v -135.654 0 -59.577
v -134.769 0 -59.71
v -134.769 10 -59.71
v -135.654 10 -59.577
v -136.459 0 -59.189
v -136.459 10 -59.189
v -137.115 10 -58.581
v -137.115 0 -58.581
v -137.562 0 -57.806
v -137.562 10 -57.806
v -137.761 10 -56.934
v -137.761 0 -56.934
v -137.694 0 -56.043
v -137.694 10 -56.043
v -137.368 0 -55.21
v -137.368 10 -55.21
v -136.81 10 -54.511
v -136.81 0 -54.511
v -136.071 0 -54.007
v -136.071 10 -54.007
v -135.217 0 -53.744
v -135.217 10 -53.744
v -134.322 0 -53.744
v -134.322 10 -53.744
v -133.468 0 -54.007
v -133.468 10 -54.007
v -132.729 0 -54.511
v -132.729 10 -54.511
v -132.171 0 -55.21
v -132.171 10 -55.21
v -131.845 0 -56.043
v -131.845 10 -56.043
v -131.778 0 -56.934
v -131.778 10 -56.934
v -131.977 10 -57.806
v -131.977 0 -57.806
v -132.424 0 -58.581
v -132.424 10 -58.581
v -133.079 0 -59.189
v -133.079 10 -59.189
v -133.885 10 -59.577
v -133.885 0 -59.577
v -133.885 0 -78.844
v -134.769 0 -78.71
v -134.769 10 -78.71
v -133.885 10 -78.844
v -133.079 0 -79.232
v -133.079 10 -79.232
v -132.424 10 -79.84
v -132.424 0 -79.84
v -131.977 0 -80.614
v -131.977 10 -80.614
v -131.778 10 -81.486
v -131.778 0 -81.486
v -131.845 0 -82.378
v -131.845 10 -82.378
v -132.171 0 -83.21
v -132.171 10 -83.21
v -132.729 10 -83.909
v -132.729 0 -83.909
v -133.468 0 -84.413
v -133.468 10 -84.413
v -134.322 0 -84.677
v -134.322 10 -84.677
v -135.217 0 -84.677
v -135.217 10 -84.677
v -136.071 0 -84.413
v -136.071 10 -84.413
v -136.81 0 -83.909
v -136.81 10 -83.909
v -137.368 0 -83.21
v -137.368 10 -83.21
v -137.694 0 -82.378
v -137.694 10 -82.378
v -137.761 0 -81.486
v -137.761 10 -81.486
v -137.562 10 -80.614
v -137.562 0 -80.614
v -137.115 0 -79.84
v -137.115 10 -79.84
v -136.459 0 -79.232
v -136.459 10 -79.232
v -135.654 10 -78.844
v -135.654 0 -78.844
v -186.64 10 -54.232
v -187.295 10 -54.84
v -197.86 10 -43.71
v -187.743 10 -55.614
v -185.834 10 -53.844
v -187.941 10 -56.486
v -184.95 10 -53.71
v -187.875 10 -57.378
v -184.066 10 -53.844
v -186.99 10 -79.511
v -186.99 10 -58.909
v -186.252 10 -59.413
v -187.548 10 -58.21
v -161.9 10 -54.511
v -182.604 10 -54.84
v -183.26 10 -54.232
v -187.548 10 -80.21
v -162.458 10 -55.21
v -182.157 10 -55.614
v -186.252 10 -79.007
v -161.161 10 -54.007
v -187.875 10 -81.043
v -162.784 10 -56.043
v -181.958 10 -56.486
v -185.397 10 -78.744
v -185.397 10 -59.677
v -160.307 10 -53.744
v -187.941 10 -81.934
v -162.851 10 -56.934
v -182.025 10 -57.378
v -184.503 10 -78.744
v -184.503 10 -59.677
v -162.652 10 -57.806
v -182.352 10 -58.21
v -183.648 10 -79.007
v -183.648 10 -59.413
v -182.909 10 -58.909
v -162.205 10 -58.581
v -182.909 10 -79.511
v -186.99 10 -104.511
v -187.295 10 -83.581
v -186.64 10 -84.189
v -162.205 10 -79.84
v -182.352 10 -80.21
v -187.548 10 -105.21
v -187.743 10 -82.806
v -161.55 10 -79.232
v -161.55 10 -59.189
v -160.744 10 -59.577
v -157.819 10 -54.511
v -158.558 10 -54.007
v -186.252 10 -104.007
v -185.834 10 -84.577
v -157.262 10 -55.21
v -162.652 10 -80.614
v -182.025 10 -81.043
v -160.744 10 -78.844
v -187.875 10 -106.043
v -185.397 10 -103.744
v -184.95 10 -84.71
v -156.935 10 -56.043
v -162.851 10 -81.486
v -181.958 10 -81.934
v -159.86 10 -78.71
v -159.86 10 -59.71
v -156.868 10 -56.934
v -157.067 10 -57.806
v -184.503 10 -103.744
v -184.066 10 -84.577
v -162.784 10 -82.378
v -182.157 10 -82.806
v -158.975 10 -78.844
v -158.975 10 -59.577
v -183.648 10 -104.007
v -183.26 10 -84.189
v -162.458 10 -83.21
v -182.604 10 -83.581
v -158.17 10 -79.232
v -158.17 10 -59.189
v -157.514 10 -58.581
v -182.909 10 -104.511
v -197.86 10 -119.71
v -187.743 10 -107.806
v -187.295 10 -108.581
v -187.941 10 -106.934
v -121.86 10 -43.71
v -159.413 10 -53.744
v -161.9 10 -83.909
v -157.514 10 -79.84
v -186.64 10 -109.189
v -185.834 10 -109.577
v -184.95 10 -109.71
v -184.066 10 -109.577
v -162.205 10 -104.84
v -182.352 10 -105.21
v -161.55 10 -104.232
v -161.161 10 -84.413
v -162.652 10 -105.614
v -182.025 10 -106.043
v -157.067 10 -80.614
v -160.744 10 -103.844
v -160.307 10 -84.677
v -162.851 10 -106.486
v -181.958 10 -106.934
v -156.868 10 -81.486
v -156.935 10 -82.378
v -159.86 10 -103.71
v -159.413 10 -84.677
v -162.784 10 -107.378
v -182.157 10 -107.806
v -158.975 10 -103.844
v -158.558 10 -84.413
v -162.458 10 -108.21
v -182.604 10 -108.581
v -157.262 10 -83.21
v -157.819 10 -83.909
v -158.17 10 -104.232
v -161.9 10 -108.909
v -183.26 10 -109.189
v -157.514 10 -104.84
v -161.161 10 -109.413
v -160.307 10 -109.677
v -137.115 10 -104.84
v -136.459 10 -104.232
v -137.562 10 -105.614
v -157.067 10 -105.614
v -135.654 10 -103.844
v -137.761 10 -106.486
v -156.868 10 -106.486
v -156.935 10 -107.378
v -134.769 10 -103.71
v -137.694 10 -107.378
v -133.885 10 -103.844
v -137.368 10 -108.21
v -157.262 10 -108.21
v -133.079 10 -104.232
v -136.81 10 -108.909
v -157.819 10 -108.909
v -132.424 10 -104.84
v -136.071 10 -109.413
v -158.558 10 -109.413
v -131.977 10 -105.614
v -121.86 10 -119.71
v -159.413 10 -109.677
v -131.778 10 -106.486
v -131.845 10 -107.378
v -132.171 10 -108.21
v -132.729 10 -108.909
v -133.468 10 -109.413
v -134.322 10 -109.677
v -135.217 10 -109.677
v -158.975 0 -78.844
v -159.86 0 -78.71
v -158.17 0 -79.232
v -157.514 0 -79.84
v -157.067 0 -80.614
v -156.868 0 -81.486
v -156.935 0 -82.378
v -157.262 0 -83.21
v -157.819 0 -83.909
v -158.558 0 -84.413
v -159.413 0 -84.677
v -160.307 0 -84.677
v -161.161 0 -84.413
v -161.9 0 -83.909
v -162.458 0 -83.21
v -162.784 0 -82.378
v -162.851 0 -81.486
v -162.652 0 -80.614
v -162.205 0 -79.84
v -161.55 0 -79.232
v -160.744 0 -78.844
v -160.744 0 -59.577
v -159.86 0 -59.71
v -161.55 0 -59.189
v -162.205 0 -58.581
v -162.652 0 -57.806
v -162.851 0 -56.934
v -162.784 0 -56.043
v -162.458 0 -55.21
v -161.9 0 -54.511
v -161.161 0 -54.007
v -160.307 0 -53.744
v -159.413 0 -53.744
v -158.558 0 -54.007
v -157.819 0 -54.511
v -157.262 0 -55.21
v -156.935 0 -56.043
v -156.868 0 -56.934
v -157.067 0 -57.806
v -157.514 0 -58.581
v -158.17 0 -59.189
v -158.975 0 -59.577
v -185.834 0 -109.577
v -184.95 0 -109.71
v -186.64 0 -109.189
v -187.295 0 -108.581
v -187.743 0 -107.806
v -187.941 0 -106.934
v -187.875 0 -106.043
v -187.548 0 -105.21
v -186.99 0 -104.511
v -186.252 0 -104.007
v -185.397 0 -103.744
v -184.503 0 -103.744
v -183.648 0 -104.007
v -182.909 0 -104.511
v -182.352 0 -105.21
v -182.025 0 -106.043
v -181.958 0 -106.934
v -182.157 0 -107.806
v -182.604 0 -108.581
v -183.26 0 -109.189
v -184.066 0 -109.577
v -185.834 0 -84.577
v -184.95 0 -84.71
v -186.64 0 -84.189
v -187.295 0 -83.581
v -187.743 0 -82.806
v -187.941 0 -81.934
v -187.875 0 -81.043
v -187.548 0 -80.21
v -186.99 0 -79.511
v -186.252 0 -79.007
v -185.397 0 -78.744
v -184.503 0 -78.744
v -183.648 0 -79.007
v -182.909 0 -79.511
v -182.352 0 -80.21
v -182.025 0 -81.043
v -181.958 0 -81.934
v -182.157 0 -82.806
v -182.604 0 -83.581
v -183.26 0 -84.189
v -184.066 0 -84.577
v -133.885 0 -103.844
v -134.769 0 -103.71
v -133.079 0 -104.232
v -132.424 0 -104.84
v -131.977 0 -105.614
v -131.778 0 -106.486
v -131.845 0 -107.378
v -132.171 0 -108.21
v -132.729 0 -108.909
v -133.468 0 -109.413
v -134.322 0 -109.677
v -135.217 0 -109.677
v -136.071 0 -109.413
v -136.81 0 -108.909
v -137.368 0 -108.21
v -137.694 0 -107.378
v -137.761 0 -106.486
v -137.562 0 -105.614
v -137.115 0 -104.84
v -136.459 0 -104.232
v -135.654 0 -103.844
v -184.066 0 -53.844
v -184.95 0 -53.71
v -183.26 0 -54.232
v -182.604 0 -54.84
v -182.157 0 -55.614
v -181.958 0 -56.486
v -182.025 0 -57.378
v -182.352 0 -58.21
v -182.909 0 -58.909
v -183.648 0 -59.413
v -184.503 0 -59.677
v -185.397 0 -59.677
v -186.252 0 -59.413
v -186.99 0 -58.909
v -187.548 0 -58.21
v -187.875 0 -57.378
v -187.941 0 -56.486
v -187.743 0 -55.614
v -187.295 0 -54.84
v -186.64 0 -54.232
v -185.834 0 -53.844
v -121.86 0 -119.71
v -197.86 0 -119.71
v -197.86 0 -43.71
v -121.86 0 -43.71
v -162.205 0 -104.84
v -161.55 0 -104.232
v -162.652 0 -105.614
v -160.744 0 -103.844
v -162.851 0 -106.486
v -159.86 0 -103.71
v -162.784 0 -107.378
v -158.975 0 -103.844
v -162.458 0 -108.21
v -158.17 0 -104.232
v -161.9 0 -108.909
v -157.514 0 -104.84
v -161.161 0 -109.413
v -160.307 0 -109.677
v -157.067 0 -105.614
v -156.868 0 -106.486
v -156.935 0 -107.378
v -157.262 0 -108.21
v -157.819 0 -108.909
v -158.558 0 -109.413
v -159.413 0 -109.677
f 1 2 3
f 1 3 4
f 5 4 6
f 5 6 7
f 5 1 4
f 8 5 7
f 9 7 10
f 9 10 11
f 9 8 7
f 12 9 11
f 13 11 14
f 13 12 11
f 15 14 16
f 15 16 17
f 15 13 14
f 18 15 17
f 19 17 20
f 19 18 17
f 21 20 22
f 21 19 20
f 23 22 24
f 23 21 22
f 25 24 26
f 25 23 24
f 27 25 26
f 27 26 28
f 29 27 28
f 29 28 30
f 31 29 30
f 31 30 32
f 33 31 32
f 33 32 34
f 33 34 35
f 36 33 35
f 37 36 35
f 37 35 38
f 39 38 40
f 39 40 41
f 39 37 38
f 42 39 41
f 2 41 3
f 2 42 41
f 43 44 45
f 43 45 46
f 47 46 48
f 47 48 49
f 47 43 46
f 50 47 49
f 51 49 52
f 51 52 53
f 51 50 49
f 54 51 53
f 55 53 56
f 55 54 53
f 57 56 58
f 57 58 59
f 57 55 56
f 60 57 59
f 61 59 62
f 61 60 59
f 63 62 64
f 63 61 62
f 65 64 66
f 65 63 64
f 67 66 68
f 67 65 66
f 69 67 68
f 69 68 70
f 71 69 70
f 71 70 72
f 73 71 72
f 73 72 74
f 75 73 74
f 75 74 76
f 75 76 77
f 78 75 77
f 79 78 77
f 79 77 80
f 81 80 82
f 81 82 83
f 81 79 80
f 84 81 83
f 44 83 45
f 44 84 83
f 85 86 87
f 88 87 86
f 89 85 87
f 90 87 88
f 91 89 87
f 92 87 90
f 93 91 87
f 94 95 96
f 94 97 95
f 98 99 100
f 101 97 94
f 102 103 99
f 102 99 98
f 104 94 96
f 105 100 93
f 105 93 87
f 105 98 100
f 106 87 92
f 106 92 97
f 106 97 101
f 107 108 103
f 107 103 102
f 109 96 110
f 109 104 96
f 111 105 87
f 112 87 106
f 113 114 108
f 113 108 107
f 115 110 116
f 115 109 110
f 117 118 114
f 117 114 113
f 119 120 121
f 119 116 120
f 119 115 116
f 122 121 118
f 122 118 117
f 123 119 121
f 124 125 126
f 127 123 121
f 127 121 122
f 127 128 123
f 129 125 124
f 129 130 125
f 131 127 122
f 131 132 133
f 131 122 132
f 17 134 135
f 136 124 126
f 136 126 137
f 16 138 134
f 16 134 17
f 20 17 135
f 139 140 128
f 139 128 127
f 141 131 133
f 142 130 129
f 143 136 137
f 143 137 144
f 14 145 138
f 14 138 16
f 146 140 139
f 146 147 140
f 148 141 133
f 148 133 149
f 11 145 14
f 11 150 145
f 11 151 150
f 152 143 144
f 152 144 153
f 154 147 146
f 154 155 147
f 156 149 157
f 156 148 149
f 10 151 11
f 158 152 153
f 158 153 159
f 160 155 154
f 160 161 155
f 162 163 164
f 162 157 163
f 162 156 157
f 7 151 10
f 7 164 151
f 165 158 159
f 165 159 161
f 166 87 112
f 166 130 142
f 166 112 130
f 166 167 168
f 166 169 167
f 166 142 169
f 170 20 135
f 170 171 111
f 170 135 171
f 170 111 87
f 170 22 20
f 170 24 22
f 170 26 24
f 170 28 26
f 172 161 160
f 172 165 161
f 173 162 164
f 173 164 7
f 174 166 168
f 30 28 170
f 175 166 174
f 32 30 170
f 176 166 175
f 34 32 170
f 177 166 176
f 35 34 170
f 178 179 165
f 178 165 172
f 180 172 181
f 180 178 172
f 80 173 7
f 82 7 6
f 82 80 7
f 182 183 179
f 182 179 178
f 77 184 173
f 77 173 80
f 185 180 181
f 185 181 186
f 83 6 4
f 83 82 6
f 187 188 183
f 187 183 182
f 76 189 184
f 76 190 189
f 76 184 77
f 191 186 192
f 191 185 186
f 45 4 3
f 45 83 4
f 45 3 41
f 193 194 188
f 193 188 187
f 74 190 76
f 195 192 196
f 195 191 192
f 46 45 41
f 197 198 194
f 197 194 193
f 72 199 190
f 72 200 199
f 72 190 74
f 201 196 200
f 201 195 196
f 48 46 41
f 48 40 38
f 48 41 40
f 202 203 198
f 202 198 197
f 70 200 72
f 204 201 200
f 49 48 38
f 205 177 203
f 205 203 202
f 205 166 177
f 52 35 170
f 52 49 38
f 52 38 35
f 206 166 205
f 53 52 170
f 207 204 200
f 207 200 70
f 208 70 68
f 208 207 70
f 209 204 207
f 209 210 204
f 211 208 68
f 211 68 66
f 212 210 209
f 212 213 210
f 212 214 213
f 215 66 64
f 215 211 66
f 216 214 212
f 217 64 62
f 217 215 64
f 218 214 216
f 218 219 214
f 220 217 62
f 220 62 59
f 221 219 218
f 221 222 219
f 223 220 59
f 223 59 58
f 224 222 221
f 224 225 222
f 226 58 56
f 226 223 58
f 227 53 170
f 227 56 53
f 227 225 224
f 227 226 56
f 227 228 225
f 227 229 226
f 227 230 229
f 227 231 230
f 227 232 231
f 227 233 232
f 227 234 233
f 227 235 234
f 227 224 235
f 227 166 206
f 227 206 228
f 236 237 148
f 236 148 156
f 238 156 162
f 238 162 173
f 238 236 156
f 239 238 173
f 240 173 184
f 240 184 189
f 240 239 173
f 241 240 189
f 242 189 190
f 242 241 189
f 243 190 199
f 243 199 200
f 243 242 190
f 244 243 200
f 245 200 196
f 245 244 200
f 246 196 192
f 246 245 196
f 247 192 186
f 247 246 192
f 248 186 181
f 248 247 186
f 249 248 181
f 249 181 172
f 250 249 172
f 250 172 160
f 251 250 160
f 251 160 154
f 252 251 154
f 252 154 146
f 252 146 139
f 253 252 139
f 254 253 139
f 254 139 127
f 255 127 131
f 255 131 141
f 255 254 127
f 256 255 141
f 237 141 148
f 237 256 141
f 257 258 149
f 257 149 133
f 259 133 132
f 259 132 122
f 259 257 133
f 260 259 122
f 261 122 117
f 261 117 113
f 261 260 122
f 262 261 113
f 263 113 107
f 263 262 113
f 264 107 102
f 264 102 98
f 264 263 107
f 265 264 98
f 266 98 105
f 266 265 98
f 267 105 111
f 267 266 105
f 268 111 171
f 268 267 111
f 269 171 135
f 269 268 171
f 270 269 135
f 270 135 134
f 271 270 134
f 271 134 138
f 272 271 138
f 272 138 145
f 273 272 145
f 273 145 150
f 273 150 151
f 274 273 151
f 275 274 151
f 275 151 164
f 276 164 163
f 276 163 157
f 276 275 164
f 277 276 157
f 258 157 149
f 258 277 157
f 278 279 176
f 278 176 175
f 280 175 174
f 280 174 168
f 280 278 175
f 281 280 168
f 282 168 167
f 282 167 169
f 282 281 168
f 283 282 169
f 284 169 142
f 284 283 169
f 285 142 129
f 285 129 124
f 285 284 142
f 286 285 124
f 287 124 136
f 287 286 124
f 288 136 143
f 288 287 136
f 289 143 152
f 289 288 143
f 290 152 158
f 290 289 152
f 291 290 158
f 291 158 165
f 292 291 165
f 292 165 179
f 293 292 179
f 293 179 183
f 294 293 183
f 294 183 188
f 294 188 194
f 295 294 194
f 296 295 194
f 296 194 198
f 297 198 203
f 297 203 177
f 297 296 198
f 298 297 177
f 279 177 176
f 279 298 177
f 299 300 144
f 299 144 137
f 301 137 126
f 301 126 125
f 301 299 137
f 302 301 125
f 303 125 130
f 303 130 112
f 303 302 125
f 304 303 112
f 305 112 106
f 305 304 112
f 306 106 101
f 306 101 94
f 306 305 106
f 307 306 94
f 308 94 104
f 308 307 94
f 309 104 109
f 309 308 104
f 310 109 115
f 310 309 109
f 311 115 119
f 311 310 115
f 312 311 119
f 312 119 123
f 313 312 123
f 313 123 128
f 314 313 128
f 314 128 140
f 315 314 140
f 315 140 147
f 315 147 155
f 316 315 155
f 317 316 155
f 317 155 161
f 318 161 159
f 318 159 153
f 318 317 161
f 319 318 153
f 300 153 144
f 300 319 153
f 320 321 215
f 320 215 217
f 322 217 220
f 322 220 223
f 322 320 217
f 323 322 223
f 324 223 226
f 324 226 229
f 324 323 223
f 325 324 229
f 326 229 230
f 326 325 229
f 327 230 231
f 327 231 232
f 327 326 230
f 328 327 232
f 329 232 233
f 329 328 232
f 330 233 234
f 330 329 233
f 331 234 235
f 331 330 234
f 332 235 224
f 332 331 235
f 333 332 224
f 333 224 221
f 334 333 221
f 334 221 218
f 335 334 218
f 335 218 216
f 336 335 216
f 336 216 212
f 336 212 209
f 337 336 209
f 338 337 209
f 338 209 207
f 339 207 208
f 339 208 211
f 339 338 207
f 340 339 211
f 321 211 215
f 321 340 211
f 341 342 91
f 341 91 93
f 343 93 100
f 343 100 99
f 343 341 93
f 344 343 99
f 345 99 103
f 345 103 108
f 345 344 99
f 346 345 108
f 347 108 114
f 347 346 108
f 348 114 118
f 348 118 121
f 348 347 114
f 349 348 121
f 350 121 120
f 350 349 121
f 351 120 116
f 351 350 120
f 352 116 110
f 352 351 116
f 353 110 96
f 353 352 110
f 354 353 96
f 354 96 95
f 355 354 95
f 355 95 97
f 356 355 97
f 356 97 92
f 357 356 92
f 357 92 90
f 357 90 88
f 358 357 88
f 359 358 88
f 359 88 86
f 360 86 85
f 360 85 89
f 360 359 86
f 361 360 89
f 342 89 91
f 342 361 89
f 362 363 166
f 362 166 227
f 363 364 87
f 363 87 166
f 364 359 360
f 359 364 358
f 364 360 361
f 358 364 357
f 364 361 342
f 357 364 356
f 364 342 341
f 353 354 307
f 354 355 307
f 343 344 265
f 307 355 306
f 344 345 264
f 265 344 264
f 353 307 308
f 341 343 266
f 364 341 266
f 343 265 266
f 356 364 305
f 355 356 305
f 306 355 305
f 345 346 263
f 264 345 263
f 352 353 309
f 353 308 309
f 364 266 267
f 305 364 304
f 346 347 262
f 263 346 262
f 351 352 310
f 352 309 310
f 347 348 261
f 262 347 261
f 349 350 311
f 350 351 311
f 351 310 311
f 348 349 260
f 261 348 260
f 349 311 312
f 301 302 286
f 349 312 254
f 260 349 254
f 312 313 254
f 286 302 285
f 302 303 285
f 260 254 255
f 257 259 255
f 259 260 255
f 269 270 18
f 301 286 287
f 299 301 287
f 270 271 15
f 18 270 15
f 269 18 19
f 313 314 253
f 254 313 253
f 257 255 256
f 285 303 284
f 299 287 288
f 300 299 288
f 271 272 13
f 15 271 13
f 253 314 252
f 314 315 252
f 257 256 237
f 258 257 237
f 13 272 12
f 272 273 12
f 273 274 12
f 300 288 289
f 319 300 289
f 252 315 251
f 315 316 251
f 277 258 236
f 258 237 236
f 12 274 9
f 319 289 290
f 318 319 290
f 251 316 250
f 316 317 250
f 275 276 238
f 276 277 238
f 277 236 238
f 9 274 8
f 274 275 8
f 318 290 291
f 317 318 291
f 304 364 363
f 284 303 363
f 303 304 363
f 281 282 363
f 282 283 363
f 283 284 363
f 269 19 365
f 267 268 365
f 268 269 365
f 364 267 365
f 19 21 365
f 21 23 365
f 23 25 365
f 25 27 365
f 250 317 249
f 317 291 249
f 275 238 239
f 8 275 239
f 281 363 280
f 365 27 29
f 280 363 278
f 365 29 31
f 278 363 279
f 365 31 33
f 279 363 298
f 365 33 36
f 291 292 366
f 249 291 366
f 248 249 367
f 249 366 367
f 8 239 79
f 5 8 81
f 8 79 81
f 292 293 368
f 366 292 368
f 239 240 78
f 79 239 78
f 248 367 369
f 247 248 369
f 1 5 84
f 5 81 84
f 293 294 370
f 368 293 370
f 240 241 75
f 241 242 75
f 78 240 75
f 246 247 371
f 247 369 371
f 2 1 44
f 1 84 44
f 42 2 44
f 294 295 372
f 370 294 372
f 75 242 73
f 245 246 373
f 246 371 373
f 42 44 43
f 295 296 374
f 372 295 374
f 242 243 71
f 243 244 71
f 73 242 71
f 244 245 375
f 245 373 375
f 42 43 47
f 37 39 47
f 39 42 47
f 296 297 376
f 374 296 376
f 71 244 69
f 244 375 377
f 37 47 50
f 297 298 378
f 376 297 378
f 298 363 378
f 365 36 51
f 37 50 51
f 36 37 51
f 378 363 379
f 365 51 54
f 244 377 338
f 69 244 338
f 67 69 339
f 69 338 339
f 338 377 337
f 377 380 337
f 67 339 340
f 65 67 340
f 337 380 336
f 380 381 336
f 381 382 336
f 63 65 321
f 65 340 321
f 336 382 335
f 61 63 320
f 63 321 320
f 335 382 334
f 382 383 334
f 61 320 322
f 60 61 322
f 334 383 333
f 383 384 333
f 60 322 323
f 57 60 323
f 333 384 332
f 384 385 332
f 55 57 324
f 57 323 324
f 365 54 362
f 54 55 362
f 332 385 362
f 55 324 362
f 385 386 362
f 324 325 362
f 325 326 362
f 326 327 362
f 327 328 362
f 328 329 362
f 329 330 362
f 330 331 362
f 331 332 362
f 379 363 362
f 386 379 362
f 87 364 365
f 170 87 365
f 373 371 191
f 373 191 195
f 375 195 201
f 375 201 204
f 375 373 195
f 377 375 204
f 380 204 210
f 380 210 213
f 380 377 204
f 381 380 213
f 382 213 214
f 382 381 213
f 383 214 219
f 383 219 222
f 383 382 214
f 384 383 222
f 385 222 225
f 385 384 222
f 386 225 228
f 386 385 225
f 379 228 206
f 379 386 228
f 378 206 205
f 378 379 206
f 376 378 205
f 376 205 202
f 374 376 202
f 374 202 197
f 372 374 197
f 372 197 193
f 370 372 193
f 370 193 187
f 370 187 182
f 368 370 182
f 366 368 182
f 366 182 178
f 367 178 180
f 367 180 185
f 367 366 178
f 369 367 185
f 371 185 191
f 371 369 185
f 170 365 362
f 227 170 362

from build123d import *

# Parameters (mm, degrees)
SKETCH1_W           = 76
SKETCH1_H           = 76
SKETCH1_R           = 3
BOSS_EXTRUDE1_DEPTH = 10


with BuildPart() as part:
    # Sketch1 → Boss-Extrude1 (new body)
    with BuildSketch(Plane(origin=(0, 0, 0), x_dir=(1, 0, 0), z_dir=(0, 1, 0))):
        with Locations((-159.8596663, 81.710219679)):
            Rectangle(SKETCH1_W, SKETCH1_H)
        with Locations(Location((-159.8596663, 81.710219679, 0), (0, 0, 270))):
            Circle(SKETCH1_R, mode=Mode.SUBTRACT)
        with Locations(Location((-134.769453056, 81.710219679, 0), (0, 0, 270))):
            Circle(SKETCH1_R, mode=Mode.SUBTRACT)
        with Locations(Location((-184.949879544, 81.710219679, 0), (0, 0, 90))):
            Circle(SKETCH1_R, mode=Mode.SUBTRACT)
        with Locations(Location((-184.949879544, 106.710219679, 0), (0, 0, 90))):
            Circle(SKETCH1_R, mode=Mode.SUBTRACT)
        with Locations(Location((-159.8596663, 106.710219679, 0), (0, 0, 270))):
            Circle(SKETCH1_R, mode=Mode.SUBTRACT)
        with Locations(Location((-134.769453056, 106.710219679, 0), (0, 0, 270))):
            Circle(SKETCH1_R, mode=Mode.SUBTRACT)
        with Locations(Location((-134.769453056, 56.710219679, 0), (0, 0, 90))):
            Circle(SKETCH1_R, mode=Mode.SUBTRACT)
        with Locations(Location((-159.8596663, 56.710219679, 0), (0, 0, 90))):
            Circle(SKETCH1_R, mode=Mode.SUBTRACT)
        with Locations(Location((-184.949879544, 56.710219679, 0), (0, 0, 270))):
            Circle(SKETCH1_R, mode=Mode.SUBTRACT)
    extrude(amount=BOSS_EXTRUDE1_DEPTH)


solid = part.part
